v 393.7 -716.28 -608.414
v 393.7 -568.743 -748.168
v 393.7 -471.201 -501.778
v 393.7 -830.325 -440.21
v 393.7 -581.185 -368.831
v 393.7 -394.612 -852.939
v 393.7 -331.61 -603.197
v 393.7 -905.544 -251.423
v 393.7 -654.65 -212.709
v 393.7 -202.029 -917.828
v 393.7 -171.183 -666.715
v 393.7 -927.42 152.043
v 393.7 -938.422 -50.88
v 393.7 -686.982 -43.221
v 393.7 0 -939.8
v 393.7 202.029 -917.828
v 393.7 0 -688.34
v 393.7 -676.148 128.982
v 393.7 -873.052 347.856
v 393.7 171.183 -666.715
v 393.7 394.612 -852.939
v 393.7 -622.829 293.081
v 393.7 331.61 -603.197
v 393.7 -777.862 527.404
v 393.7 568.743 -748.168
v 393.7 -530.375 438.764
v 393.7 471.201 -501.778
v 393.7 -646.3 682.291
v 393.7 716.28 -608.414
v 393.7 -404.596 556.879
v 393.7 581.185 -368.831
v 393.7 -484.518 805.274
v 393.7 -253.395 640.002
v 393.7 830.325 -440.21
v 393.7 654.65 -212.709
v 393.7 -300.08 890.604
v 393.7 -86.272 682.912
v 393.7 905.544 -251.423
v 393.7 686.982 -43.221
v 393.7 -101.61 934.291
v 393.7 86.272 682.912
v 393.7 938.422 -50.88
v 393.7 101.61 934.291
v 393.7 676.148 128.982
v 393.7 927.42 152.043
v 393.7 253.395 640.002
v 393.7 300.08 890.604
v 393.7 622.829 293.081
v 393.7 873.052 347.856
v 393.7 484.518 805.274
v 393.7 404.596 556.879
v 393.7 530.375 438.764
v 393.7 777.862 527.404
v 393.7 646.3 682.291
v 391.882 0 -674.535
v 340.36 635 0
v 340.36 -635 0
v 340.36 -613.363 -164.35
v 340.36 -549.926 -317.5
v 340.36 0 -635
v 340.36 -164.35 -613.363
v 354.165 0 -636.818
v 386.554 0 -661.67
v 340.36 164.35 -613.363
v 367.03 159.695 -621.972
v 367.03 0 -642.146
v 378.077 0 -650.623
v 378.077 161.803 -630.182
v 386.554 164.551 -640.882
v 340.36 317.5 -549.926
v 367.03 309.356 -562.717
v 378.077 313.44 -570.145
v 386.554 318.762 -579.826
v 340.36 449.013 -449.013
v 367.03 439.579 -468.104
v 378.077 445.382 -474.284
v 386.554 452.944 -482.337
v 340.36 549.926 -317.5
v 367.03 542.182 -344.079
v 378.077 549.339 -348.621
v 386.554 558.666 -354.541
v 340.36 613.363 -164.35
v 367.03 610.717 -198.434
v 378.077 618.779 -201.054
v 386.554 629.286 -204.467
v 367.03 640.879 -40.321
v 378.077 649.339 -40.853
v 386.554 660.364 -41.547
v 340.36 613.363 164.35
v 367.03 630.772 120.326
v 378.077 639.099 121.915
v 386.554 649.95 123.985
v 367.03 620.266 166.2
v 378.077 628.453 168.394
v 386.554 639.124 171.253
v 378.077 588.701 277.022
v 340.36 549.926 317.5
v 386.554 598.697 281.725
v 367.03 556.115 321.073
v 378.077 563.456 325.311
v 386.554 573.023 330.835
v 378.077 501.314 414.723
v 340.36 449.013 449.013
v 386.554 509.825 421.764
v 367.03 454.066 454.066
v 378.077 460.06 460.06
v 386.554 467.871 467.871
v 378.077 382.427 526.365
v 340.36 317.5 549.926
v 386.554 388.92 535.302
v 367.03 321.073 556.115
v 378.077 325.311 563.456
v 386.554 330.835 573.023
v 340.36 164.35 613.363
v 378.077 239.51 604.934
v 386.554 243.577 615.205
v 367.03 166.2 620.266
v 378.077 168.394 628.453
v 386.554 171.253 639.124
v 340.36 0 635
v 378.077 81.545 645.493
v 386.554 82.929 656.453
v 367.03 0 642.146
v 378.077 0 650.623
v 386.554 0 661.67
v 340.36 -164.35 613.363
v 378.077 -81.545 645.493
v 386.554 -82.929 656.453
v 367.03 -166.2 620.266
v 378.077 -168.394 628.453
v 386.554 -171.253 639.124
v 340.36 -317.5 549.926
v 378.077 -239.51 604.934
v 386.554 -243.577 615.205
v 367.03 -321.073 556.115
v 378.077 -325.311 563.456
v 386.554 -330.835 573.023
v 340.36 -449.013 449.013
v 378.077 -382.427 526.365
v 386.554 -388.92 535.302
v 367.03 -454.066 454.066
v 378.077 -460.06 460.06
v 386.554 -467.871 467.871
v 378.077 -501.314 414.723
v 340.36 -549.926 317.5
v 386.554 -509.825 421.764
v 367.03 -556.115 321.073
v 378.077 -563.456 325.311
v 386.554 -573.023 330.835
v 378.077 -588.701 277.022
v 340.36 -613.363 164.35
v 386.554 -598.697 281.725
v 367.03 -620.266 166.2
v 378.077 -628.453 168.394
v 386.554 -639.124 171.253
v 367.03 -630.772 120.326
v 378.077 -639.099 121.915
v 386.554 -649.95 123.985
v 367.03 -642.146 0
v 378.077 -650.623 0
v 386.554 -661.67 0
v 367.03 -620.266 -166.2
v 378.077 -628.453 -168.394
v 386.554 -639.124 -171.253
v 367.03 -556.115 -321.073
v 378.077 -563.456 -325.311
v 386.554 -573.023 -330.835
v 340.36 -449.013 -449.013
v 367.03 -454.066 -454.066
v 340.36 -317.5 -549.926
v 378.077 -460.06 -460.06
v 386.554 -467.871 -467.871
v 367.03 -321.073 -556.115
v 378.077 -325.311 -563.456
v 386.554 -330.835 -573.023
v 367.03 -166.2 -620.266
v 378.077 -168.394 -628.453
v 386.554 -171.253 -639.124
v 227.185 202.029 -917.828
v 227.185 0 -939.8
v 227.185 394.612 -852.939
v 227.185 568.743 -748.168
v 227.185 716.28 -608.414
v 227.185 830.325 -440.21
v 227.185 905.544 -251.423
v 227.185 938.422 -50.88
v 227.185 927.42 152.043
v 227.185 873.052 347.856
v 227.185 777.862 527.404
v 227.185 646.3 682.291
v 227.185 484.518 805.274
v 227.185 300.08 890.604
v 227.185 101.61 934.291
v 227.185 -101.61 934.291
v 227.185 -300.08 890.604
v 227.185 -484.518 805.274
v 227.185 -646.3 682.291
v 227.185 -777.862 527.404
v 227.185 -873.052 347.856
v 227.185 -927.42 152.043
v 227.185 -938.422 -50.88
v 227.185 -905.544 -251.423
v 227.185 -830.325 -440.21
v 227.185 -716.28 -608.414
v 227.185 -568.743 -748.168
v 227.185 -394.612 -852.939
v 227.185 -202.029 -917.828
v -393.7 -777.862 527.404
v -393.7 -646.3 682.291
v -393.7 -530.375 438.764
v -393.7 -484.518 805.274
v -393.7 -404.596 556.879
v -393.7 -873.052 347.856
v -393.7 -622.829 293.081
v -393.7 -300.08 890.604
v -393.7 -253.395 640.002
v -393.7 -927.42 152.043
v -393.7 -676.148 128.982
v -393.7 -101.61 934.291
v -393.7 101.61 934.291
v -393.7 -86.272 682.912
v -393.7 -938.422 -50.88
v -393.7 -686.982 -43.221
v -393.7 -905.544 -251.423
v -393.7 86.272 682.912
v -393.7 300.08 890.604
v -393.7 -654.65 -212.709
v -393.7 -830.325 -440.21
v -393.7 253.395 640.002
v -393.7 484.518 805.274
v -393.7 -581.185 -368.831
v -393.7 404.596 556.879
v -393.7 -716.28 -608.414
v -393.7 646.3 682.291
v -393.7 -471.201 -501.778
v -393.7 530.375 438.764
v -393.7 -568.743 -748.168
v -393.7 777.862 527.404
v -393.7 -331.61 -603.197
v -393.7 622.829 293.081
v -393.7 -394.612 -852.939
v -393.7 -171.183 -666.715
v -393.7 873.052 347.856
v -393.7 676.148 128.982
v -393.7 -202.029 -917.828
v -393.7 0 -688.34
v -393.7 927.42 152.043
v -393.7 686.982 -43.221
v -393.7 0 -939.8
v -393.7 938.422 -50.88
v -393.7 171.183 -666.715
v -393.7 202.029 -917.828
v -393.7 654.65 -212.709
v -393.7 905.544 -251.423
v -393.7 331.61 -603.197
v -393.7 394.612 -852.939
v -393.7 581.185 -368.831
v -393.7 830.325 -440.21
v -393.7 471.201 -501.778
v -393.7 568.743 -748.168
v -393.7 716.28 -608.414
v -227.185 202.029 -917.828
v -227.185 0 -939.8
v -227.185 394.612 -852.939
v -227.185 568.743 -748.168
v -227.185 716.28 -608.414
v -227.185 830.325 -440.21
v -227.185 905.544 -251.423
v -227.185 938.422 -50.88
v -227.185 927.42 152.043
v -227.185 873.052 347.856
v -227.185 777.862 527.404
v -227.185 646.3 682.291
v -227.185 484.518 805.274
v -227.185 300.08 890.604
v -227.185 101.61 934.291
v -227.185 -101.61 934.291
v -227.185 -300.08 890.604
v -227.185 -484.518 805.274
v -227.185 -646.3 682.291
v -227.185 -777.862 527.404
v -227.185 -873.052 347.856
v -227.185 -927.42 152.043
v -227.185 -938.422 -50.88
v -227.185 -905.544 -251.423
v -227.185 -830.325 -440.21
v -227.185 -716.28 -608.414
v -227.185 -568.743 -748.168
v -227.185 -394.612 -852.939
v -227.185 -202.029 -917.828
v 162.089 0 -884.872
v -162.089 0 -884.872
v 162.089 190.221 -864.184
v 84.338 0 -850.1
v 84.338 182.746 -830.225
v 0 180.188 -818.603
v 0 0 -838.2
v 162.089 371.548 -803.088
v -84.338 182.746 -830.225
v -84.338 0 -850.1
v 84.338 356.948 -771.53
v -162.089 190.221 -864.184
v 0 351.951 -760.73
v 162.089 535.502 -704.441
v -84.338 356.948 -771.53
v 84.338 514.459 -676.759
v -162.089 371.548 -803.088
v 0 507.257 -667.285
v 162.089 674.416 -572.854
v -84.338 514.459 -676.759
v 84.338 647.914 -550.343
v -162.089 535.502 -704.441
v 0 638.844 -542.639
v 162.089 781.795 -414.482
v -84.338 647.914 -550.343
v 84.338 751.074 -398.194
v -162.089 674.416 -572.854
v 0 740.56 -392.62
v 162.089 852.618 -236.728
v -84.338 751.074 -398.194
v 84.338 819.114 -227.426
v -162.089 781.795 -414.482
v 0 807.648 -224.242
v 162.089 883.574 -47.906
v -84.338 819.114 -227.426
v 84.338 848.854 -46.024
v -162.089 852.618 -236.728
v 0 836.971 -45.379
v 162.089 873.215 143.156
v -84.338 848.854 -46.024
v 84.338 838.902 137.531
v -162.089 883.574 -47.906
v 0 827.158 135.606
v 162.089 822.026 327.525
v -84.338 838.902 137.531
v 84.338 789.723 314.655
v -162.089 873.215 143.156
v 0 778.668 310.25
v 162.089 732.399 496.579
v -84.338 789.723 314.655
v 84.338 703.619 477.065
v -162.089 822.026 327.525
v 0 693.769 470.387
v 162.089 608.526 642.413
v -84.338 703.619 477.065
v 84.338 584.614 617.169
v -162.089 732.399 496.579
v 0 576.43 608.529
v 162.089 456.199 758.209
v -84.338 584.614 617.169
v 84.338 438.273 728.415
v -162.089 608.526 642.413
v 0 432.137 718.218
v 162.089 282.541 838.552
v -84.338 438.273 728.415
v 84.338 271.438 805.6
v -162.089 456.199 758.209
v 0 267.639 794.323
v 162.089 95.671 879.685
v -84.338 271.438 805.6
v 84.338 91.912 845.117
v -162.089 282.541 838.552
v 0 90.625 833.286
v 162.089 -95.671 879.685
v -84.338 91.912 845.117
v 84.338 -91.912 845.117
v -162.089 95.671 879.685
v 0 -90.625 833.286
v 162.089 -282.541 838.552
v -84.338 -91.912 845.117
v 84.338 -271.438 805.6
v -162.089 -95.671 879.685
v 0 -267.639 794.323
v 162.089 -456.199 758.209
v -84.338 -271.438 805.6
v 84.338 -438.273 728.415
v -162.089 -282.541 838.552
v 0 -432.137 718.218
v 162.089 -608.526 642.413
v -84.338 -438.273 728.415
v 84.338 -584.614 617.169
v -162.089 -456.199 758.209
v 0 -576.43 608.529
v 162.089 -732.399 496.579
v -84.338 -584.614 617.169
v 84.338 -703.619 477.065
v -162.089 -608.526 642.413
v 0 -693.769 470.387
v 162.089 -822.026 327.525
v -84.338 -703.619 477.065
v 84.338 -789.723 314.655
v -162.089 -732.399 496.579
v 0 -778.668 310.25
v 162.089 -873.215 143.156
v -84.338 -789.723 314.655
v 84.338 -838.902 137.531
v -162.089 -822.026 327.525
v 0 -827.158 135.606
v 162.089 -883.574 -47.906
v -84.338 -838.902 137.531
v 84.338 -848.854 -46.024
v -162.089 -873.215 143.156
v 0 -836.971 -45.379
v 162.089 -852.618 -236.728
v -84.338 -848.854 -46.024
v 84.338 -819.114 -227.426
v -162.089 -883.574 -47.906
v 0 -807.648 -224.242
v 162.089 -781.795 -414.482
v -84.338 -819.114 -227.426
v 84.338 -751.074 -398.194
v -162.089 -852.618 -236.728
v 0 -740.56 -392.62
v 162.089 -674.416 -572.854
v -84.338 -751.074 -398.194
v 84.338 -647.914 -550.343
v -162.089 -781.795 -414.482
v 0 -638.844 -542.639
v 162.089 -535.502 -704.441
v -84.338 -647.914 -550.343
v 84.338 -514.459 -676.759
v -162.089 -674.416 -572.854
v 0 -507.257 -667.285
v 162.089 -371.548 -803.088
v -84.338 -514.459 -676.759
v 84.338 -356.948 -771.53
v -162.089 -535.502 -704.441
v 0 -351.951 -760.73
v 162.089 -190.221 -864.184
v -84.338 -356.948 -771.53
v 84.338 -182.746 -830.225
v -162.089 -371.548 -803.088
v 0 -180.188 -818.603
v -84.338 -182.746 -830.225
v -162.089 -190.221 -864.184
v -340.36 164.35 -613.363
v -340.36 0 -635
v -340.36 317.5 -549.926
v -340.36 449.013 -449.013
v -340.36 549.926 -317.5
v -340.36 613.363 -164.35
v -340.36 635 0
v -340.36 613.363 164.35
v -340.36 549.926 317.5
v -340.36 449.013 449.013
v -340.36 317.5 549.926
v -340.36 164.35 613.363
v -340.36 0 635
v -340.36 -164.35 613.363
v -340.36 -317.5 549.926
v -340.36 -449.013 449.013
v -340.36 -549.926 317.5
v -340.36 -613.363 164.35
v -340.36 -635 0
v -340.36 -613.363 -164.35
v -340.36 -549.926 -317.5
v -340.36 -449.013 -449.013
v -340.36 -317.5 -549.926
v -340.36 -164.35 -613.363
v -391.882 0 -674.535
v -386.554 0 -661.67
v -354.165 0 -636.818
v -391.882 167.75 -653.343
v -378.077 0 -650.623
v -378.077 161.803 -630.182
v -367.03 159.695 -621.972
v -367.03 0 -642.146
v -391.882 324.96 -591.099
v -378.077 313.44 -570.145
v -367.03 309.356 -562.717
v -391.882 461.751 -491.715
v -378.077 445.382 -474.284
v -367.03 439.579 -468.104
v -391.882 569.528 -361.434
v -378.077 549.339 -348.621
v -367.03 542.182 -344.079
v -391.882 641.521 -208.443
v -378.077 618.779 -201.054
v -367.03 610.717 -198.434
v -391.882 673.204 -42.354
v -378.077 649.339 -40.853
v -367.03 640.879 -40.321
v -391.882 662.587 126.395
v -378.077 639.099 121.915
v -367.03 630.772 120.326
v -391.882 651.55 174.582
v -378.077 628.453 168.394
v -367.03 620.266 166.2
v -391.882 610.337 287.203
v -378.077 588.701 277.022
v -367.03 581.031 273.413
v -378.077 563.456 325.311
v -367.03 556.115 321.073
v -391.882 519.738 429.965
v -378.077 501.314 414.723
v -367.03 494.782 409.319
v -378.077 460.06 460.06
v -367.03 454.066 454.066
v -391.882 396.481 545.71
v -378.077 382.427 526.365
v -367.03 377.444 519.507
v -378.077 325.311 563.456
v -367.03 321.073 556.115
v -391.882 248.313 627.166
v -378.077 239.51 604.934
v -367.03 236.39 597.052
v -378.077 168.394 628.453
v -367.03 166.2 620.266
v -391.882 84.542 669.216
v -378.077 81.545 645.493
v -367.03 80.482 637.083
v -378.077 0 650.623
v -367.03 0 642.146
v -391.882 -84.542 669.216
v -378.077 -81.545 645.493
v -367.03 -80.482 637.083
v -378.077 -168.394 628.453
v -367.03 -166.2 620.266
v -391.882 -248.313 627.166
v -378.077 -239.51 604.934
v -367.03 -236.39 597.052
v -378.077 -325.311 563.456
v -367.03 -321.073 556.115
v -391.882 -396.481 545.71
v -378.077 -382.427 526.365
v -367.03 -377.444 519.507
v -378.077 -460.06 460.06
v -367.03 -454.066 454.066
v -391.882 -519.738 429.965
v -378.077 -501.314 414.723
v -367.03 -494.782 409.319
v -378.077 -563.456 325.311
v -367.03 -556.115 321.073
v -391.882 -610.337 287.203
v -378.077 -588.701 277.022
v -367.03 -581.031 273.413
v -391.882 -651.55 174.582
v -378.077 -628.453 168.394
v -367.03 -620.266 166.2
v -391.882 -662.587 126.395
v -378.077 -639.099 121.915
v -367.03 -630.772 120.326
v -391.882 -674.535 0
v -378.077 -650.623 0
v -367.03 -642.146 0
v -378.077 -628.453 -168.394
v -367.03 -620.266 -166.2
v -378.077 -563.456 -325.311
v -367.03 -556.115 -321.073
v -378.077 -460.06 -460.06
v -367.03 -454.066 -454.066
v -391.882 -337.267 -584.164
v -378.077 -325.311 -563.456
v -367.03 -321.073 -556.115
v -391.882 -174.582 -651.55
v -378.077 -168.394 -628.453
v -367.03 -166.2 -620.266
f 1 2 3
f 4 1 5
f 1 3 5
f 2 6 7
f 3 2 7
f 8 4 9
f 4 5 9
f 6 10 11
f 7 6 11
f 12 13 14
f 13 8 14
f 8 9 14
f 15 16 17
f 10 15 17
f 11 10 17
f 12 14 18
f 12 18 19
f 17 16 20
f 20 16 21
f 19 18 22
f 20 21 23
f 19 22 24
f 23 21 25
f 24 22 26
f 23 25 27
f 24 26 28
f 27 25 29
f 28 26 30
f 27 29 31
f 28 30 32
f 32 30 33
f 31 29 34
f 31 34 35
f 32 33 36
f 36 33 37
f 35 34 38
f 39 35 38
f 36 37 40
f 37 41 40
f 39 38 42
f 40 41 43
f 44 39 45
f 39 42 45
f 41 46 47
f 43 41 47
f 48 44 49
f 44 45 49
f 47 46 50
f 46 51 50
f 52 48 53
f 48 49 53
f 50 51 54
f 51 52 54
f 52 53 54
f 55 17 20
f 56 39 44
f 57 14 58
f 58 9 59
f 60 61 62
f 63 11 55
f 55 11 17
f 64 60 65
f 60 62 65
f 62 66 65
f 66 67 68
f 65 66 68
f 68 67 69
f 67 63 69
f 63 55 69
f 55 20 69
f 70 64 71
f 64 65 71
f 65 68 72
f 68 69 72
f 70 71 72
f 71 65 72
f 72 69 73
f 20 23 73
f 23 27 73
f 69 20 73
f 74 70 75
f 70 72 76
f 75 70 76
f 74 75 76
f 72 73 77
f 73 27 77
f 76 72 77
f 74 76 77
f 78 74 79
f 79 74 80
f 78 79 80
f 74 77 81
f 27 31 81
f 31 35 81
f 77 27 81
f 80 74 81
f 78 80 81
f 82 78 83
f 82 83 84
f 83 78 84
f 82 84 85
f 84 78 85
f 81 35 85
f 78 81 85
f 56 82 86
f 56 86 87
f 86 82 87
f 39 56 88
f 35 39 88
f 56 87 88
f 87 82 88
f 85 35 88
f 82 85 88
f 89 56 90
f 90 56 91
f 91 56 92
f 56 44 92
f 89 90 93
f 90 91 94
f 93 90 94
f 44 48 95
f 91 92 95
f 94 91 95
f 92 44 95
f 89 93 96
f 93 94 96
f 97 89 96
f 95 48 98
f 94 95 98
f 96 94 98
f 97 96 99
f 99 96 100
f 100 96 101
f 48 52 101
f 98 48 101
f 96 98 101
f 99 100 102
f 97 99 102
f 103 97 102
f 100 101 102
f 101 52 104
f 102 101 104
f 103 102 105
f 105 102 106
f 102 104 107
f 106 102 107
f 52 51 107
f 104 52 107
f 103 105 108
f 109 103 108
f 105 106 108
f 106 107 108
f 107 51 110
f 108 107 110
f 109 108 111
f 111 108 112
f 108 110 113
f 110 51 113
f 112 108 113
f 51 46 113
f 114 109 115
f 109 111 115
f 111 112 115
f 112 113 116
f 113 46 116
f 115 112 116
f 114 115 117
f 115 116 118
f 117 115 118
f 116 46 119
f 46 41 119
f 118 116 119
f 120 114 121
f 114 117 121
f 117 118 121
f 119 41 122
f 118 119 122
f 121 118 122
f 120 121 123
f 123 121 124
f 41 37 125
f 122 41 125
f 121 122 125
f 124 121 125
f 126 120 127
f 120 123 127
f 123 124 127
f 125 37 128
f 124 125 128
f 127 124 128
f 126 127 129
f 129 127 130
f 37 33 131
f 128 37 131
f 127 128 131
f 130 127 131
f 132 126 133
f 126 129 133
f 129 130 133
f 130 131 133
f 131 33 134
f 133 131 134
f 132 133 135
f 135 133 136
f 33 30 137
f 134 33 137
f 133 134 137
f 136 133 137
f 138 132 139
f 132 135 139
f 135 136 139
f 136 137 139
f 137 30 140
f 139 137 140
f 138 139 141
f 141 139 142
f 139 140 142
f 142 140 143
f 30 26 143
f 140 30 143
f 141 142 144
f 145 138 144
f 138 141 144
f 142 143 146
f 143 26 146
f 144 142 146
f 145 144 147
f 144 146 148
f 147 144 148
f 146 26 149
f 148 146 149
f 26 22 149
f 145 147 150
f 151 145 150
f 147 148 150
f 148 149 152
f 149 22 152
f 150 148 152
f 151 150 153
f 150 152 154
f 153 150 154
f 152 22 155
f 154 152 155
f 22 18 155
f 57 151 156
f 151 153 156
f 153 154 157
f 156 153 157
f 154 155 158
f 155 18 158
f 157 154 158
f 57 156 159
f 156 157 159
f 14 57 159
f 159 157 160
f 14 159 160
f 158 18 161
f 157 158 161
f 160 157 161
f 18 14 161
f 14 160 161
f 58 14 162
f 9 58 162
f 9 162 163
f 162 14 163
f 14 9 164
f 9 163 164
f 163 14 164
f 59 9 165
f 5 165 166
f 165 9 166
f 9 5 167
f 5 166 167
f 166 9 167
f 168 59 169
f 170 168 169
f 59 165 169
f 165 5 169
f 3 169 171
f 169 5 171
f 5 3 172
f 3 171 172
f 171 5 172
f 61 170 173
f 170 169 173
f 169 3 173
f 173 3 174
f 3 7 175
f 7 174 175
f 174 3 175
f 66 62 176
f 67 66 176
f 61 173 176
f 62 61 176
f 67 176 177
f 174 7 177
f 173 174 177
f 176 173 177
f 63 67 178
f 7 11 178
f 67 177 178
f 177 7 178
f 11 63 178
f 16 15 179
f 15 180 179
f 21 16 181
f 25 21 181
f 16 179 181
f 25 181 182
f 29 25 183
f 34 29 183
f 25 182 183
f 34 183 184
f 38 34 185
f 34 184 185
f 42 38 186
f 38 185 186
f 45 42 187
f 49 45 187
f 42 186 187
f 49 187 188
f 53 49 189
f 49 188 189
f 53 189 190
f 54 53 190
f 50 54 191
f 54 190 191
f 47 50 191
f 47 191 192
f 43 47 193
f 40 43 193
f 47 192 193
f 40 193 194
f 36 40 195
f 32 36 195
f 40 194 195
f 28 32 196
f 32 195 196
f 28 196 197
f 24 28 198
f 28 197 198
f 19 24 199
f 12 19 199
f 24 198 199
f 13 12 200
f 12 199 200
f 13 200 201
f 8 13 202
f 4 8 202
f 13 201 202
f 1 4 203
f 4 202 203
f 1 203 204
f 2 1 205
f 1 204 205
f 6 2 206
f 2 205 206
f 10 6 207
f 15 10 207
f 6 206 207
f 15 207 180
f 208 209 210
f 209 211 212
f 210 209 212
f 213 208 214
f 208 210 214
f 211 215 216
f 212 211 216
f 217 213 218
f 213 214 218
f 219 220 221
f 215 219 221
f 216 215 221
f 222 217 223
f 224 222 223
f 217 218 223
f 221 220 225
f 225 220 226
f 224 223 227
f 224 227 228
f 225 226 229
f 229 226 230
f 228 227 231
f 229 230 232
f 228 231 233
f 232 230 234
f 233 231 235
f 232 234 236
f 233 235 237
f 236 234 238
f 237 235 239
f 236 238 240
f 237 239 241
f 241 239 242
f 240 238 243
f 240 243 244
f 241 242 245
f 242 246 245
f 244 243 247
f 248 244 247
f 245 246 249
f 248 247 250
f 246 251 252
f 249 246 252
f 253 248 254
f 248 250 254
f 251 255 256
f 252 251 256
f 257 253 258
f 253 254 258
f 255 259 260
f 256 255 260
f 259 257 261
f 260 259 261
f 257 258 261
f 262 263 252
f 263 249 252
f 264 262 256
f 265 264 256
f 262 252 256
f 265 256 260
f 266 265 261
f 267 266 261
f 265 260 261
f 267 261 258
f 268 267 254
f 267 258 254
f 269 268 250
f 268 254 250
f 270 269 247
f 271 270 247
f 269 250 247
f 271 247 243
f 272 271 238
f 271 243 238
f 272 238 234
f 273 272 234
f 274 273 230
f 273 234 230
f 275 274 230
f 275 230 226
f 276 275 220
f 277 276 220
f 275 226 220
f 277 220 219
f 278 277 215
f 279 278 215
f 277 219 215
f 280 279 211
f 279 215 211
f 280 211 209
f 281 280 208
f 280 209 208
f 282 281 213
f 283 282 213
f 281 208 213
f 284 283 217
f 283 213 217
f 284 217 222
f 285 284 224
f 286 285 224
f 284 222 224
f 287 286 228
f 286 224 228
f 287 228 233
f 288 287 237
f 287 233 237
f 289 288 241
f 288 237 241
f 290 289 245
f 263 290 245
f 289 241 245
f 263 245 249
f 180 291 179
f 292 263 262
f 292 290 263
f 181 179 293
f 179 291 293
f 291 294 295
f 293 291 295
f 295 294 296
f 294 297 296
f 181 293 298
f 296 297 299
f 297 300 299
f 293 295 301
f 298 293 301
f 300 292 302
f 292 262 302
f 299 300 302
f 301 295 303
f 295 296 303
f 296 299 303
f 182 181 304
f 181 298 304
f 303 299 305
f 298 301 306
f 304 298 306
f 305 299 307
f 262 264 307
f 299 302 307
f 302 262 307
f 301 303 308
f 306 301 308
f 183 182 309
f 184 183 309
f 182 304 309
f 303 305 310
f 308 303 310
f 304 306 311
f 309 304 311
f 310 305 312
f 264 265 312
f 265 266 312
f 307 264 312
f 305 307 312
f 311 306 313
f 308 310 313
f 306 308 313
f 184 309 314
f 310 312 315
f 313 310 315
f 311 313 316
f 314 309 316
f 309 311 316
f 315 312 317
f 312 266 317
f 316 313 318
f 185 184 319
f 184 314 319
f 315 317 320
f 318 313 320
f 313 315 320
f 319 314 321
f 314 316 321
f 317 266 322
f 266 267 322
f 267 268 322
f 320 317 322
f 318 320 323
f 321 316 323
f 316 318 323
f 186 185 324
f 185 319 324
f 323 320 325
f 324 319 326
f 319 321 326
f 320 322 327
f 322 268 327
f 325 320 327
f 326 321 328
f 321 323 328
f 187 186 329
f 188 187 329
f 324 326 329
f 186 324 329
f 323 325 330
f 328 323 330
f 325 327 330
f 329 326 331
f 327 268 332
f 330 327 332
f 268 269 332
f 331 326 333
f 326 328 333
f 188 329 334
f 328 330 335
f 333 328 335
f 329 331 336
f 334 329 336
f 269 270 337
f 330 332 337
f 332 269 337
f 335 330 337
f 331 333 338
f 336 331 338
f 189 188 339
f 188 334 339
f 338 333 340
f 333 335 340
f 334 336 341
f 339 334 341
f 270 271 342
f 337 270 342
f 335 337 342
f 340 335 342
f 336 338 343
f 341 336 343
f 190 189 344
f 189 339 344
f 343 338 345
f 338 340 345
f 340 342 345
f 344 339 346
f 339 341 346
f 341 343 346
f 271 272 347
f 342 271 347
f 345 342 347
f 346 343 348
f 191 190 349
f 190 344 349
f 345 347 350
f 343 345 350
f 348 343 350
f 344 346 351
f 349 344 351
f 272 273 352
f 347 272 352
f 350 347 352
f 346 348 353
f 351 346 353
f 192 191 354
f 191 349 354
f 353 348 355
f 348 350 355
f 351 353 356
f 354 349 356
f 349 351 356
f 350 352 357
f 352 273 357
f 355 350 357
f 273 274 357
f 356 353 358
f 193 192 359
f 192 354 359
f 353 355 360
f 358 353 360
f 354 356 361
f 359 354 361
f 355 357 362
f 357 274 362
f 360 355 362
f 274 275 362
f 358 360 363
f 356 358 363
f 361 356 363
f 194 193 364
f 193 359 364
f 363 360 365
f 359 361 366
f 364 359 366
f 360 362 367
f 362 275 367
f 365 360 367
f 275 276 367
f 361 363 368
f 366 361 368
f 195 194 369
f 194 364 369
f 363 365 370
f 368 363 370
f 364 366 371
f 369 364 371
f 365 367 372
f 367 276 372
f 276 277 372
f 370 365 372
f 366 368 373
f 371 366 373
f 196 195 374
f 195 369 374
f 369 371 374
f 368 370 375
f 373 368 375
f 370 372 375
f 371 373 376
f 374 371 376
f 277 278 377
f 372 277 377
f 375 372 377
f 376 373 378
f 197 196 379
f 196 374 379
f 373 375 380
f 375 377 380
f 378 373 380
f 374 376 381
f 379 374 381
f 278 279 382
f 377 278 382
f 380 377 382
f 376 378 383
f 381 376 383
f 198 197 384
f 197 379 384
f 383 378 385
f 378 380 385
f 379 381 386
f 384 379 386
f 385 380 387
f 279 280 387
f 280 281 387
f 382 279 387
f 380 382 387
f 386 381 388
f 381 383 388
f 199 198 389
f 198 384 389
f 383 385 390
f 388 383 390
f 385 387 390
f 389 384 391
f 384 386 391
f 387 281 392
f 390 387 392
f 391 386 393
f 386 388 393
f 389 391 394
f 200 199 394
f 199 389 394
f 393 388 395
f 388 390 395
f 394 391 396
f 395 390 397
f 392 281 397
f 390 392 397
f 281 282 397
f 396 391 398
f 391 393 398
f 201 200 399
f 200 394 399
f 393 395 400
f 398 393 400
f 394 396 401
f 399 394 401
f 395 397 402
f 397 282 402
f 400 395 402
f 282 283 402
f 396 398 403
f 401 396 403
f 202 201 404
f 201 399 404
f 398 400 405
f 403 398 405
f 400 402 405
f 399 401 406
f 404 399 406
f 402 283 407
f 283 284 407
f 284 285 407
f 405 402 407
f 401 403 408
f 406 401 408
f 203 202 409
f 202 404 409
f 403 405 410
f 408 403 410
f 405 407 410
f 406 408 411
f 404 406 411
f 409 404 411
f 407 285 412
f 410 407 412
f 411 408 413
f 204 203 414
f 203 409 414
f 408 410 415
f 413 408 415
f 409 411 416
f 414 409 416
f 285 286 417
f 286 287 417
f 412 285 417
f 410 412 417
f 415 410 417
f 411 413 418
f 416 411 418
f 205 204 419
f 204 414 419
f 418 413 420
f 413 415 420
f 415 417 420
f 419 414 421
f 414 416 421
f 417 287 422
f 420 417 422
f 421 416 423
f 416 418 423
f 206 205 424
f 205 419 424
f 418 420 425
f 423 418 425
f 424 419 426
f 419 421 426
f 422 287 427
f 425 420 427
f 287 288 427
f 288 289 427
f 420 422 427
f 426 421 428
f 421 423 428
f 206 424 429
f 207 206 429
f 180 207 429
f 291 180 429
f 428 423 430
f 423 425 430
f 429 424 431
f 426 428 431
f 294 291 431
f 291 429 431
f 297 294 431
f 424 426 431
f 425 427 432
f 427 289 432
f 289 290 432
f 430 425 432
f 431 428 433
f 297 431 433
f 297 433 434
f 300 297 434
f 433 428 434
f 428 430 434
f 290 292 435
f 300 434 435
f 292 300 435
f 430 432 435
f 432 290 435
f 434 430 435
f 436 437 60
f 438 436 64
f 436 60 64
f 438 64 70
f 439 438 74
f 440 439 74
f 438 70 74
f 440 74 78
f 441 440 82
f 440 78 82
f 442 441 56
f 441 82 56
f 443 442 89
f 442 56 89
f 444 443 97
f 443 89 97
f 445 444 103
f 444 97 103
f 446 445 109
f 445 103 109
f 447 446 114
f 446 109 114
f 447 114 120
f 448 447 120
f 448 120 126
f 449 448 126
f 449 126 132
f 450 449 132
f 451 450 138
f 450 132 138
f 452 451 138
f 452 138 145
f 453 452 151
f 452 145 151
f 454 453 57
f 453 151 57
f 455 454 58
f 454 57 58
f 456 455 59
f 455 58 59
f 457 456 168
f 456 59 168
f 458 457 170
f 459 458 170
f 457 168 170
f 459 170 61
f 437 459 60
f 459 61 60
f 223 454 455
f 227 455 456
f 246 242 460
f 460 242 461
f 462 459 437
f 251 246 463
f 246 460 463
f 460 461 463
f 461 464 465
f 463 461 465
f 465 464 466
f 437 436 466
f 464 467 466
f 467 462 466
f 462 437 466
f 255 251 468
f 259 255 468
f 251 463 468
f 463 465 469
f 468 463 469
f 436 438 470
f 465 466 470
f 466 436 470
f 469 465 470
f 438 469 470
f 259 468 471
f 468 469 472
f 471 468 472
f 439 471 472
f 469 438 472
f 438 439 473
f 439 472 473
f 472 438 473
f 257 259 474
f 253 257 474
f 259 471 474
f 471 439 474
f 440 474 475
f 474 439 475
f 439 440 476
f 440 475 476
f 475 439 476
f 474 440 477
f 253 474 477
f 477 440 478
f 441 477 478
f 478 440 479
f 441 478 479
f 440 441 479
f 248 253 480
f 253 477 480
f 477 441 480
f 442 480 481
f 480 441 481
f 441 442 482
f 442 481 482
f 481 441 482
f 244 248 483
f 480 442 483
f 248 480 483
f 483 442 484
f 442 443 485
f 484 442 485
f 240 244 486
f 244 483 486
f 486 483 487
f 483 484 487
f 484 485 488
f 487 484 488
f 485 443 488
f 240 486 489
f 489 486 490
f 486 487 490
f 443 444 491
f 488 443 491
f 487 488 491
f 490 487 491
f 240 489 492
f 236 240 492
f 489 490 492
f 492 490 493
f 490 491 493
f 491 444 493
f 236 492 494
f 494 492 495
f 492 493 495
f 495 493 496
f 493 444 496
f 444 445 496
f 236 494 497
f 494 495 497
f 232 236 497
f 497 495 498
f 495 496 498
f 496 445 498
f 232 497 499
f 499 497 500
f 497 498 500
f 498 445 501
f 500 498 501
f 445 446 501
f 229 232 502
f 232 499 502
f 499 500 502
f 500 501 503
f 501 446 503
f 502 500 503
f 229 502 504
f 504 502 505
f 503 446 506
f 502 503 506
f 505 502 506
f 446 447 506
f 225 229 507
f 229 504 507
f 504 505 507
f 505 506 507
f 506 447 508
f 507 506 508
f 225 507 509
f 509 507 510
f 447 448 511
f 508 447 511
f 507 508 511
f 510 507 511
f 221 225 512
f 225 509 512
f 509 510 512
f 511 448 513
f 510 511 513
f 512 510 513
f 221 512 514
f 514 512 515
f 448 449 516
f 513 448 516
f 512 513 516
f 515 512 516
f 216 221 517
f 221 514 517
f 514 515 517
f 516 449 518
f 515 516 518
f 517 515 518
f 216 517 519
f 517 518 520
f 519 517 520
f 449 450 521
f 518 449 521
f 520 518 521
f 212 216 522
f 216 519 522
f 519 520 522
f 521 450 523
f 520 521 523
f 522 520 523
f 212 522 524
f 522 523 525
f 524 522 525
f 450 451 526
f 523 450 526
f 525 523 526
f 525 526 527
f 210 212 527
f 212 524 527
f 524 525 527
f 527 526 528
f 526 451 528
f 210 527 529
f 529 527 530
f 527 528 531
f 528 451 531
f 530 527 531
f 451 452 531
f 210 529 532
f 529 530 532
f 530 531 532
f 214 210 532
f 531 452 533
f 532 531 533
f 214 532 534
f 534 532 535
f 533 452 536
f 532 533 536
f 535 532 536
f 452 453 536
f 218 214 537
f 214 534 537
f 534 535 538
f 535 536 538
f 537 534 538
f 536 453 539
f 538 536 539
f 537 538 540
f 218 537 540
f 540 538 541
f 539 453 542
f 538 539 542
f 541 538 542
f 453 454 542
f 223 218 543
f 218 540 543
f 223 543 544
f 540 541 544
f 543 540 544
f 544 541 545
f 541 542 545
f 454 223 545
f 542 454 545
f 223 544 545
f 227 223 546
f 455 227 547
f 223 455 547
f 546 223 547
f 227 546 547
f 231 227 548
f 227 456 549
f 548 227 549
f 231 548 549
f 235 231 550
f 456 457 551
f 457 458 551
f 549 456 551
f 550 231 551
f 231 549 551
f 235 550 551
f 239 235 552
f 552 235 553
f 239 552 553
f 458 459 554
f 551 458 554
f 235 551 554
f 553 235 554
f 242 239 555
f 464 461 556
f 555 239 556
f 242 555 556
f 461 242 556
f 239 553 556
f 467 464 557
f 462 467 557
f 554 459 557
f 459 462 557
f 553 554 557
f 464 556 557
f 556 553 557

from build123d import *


with BuildPart() as part:
    # Sketch2 → Revolve1 (revolve)
    with BuildSketch(Plane(origin=(0, 0, 0), x_dir=(1, 0, 0), z_dir=(0, 1, 0))):
        with BuildLine():
            Line((-340.36, 635), (340.36, 635))
            ThreePointArc((340.36, 635), (378.077075708, 650.622924292), (393.7, 688.34))
            Line((393.7, 688.34), (393.7, 939.8))
            Line((393.7, 939.8), (227.184506514, 939.8))
            ThreePointArc((227.184506514, 939.8), (0, 838.2), (-227.184506514, 939.8))
            Line((-227.184506514, 939.8), (-393.7, 939.8))
            Line((-393.7, 939.8), (-393.7, 688.34))
            ThreePointArc((-393.7, 688.34), (-378.077075708, 650.622924292), (-340.36, 635))
        make_face()
    revolve(axis=Axis((-586.613, 0, 0), (1, 0, 0)))


solid = part.part
